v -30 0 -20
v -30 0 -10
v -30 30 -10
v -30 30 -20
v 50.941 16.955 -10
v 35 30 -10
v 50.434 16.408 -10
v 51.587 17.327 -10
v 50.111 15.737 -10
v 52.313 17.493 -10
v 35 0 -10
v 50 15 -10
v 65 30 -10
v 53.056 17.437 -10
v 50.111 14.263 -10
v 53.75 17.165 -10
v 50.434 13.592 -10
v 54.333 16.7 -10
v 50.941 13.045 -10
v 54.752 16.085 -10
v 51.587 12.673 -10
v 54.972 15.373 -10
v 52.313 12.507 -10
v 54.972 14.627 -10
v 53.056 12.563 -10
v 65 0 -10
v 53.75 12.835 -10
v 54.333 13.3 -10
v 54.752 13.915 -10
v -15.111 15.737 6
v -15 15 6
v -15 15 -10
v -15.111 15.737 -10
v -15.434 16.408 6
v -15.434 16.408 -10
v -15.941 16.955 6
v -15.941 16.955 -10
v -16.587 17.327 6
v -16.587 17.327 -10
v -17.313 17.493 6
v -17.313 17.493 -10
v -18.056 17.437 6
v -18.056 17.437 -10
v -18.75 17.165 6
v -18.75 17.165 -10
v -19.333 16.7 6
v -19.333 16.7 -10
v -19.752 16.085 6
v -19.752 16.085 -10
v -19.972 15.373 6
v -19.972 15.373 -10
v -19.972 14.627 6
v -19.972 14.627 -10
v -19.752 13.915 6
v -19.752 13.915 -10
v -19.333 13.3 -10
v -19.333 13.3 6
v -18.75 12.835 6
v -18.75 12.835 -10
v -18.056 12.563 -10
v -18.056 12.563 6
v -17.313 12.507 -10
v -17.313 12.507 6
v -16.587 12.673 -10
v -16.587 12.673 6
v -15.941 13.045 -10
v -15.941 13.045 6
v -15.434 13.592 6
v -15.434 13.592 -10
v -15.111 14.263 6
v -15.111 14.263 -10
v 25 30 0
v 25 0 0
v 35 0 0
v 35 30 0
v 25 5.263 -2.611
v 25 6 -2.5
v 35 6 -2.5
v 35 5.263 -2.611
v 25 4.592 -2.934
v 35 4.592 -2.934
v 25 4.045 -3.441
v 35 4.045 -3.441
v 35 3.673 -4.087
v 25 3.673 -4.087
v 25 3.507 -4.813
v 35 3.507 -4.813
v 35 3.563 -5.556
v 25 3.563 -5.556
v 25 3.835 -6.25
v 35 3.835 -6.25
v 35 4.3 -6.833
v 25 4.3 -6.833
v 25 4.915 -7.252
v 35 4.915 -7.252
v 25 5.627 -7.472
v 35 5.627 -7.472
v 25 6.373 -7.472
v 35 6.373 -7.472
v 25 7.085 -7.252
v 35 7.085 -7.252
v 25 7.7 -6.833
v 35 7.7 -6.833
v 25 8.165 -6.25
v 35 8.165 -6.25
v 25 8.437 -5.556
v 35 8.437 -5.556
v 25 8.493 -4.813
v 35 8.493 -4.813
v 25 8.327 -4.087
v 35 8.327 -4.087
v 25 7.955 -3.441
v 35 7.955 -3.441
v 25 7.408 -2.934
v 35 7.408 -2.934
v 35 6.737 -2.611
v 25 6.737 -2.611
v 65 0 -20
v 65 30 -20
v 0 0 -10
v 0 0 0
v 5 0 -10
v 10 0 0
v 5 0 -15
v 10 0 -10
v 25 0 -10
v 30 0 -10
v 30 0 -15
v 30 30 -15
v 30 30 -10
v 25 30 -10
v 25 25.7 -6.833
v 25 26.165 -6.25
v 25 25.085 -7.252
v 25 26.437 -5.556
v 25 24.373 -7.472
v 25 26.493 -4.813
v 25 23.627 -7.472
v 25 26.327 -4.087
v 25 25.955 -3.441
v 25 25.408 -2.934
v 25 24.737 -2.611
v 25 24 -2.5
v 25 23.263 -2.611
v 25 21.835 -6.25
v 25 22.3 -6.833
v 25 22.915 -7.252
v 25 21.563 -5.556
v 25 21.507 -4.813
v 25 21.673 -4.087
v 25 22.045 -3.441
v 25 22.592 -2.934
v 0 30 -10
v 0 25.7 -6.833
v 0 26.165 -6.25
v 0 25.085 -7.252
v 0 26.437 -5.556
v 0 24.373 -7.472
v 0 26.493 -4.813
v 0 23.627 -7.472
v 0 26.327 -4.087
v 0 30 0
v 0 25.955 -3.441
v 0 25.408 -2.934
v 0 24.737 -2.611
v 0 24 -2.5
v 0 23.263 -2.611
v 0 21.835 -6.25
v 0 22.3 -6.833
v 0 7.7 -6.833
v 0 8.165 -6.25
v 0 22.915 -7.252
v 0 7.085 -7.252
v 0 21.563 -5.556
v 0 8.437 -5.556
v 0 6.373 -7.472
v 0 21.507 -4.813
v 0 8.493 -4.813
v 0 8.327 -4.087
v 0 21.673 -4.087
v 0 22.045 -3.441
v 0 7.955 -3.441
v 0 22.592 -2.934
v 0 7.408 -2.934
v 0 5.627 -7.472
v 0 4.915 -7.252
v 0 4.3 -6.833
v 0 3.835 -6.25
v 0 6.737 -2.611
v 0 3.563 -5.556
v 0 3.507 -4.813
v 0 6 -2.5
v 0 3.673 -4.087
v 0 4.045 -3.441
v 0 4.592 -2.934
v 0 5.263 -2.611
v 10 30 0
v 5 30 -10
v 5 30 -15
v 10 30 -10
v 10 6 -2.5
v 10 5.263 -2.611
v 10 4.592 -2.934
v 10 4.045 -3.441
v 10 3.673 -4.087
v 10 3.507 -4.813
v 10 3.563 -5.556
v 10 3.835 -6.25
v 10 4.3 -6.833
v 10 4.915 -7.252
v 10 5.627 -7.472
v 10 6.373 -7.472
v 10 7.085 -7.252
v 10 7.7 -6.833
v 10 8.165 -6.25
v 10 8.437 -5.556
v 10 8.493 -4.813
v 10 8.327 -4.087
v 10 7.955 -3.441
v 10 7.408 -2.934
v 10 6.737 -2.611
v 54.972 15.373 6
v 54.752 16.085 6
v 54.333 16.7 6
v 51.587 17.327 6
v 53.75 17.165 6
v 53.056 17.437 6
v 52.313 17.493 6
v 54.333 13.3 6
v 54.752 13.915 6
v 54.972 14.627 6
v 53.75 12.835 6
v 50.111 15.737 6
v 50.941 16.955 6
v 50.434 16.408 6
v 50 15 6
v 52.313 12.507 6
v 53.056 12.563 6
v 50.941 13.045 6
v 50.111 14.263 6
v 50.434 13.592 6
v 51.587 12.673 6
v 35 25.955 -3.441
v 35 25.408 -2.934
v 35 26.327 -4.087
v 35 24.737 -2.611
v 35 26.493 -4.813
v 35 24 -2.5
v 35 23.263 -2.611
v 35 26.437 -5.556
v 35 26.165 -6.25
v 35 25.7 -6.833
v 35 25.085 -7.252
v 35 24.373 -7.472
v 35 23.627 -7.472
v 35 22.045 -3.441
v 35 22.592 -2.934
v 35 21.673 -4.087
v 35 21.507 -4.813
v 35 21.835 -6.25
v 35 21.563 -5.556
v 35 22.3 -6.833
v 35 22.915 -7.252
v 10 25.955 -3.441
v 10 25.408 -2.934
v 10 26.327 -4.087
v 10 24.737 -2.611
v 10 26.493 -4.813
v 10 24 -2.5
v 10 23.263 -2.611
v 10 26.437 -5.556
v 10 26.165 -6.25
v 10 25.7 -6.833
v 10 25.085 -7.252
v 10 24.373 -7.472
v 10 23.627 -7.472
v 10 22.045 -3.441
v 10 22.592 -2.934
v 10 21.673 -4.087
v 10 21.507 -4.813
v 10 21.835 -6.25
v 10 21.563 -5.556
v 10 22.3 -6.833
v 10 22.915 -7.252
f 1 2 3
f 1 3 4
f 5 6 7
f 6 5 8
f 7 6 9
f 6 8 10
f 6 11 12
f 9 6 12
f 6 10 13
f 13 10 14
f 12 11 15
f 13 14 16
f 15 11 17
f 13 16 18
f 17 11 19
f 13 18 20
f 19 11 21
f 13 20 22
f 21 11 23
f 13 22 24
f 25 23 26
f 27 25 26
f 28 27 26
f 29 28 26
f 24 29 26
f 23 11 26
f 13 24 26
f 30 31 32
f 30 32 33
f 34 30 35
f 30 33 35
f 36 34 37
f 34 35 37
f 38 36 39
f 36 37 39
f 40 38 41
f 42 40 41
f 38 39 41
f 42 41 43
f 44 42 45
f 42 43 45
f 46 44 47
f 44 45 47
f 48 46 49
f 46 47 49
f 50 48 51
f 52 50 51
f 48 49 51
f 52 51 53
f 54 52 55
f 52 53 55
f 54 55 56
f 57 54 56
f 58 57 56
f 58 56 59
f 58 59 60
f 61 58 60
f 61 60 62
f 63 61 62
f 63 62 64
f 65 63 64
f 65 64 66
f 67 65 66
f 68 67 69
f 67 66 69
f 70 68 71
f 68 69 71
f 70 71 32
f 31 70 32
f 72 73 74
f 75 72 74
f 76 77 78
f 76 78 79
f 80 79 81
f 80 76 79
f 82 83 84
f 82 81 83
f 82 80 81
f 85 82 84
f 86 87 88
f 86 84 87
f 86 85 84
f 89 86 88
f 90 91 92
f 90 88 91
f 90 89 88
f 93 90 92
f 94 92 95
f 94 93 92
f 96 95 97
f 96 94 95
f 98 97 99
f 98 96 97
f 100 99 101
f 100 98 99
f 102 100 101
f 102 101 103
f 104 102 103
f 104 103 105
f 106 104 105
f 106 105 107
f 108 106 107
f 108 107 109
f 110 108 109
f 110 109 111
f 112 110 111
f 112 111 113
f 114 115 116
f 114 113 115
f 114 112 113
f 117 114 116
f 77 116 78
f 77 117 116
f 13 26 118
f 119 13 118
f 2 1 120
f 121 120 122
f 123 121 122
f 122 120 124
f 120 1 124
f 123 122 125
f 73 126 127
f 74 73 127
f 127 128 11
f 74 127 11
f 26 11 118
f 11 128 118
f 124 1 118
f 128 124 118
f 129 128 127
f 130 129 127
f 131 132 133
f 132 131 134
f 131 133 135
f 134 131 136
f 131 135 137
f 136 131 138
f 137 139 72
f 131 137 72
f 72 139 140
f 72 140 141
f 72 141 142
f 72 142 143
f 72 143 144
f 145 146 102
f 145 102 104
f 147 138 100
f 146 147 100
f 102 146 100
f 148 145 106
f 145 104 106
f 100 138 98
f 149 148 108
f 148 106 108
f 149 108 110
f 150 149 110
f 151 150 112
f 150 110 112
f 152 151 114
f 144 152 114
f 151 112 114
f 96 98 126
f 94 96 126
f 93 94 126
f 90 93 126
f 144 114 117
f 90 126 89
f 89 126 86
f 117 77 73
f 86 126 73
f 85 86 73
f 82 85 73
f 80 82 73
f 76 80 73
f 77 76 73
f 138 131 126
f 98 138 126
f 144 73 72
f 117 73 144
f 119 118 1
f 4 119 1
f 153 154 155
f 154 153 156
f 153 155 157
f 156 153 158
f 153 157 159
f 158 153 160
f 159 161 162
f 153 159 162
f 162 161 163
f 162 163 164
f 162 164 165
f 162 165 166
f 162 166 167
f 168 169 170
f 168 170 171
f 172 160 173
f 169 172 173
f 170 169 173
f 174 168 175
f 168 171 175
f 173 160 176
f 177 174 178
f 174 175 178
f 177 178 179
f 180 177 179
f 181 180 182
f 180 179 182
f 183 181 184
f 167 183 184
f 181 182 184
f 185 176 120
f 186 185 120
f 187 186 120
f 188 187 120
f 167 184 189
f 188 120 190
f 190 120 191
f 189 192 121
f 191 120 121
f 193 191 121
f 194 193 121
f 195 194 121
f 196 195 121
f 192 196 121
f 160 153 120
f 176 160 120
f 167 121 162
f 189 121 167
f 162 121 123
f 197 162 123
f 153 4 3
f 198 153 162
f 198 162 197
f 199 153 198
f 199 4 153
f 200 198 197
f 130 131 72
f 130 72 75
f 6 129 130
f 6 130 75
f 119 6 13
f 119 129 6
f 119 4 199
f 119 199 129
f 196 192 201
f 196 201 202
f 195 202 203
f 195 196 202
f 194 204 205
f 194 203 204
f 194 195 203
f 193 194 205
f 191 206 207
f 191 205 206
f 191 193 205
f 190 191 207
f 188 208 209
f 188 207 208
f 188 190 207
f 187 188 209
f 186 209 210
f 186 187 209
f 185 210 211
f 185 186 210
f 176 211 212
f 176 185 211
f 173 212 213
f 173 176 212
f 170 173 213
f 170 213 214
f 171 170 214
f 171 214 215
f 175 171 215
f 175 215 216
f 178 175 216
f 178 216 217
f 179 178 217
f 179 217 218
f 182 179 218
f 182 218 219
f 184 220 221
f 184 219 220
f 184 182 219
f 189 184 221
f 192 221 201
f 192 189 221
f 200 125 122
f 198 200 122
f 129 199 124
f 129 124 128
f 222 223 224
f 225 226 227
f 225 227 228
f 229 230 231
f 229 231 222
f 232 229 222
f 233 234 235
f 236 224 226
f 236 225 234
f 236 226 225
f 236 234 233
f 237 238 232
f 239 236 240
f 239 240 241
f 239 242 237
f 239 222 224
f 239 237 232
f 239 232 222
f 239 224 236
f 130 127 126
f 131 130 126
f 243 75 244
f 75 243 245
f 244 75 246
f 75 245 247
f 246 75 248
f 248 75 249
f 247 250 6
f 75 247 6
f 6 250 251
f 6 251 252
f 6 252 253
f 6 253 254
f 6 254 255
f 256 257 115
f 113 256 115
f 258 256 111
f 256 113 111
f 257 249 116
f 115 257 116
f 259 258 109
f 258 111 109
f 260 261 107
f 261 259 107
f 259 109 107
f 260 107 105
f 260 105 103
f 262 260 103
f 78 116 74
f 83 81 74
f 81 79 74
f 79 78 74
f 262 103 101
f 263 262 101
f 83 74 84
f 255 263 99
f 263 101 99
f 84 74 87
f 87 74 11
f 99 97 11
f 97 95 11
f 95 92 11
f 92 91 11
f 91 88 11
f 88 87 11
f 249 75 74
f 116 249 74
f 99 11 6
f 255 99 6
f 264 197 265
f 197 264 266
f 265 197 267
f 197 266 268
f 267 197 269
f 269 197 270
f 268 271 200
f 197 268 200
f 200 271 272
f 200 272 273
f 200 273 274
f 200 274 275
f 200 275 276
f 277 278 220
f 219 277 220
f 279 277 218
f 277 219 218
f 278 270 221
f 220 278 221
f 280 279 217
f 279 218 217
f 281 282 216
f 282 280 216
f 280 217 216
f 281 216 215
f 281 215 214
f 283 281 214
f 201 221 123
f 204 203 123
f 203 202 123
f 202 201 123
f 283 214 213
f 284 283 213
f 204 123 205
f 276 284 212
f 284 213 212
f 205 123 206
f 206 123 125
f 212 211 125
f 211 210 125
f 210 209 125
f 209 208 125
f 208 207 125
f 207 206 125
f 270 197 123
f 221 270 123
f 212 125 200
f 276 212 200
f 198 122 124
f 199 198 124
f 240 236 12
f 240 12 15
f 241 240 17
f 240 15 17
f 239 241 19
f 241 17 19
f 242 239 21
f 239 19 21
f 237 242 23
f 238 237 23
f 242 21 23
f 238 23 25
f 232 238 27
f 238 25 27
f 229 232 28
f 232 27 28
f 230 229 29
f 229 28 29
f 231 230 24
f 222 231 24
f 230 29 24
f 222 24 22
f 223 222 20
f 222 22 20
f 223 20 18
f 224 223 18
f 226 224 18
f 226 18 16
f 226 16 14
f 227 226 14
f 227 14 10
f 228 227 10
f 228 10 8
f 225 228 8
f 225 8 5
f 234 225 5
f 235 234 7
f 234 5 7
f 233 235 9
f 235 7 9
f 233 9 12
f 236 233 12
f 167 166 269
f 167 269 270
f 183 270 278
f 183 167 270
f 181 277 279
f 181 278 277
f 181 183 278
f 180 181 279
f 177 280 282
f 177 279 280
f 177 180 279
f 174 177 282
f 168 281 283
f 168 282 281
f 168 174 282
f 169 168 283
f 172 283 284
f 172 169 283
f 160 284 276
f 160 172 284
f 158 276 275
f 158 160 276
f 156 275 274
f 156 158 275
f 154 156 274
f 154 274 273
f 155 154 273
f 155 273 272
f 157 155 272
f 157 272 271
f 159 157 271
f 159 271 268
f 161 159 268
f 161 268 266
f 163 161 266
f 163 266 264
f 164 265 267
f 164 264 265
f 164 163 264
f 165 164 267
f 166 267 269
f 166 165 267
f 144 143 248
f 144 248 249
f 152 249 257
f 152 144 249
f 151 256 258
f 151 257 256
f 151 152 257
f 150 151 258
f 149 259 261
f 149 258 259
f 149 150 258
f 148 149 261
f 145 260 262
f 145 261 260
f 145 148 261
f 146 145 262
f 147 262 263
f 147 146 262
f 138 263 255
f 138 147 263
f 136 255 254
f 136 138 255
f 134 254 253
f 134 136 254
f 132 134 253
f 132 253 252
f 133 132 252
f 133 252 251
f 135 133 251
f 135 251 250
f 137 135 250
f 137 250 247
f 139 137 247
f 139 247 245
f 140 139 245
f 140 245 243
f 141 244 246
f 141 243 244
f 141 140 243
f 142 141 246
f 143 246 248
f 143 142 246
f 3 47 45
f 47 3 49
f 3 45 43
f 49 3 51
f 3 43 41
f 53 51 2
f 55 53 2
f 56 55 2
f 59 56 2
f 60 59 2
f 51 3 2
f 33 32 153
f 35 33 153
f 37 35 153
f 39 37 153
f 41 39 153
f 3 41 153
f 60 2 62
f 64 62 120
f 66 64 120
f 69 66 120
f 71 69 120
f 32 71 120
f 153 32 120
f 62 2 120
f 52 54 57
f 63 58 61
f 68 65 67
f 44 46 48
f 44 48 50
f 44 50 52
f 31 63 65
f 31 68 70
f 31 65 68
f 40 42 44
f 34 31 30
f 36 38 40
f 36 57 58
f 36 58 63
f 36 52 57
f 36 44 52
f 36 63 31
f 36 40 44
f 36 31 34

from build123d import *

# Parameters (mm, degrees)
SKETCH1_W               = 30
SKETCH1_H               = 10
BOSS_EXTRUDE1_DEPTH     = 30
CUT_EXTRUDE1_DEPTH      = 55
CUT_EXTRUDE1_DEPTH_BACK = 22
SKETCH2_R               = 2.5
SKETCH3_R               = 2.5
BOSS_EXTRUDE2_DEPTH     = 16


with BuildPart() as part:
    # Sketch1 → Boss-Extrude1 (new body)
    with BuildSketch(Plane(origin=(0, 0, 0), x_dir=(1, 0, 0), z_dir=(0, 1, 0))):
        with Locations((-15, 15)):
            Rectangle(SKETCH1_W, SKETCH1_H)
        Polygon((30, 15), (30, 10), (25, 10), (25, 0), (35, 0), (35, 20), (0, 20), (0, 0), (10, 0), (10, 10), (5, 10), (5, 15), align=None)
        with Locations((50, 15)):
            Rectangle(SKETCH1_W, SKETCH1_H)
    extrude(amount=BOSS_EXTRUDE1_DEPTH)

    # Sketch2 → Cut-Extrude1 (cut, two sides: drawn at the far end of the back side and taken through both)
    with BuildSketch(Plane(origin=(10, 0, 0), x_dir=(0, 0, -1), z_dir=(1, 0, 0)).offset(-CUT_EXTRUDE1_DEPTH_BACK)):
        with Locations(Location((5, 24, 0), (0, 0, 180))):
            Circle(SKETCH2_R)
        with Locations(Location((5, 6, 0), (0, 0, 180))):
            Circle(SKETCH2_R)
    extrude(amount=CUT_EXTRUDE1_DEPTH + CUT_EXTRUDE1_DEPTH_BACK, mode=Mode.SUBTRACT)

    # Sketch3 → Boss-Extrude2 (add)
    with BuildSketch(Plane.XY.offset(-10)):
        with Locations((-17.5, 15)):
            Circle(SKETCH3_R)
        with Locations(Location((52.5, 15, 0), (0, 0, 180))):
            Circle(SKETCH3_R)
    extrude(amount=BOSS_EXTRUDE2_DEPTH)


solid = part.part
